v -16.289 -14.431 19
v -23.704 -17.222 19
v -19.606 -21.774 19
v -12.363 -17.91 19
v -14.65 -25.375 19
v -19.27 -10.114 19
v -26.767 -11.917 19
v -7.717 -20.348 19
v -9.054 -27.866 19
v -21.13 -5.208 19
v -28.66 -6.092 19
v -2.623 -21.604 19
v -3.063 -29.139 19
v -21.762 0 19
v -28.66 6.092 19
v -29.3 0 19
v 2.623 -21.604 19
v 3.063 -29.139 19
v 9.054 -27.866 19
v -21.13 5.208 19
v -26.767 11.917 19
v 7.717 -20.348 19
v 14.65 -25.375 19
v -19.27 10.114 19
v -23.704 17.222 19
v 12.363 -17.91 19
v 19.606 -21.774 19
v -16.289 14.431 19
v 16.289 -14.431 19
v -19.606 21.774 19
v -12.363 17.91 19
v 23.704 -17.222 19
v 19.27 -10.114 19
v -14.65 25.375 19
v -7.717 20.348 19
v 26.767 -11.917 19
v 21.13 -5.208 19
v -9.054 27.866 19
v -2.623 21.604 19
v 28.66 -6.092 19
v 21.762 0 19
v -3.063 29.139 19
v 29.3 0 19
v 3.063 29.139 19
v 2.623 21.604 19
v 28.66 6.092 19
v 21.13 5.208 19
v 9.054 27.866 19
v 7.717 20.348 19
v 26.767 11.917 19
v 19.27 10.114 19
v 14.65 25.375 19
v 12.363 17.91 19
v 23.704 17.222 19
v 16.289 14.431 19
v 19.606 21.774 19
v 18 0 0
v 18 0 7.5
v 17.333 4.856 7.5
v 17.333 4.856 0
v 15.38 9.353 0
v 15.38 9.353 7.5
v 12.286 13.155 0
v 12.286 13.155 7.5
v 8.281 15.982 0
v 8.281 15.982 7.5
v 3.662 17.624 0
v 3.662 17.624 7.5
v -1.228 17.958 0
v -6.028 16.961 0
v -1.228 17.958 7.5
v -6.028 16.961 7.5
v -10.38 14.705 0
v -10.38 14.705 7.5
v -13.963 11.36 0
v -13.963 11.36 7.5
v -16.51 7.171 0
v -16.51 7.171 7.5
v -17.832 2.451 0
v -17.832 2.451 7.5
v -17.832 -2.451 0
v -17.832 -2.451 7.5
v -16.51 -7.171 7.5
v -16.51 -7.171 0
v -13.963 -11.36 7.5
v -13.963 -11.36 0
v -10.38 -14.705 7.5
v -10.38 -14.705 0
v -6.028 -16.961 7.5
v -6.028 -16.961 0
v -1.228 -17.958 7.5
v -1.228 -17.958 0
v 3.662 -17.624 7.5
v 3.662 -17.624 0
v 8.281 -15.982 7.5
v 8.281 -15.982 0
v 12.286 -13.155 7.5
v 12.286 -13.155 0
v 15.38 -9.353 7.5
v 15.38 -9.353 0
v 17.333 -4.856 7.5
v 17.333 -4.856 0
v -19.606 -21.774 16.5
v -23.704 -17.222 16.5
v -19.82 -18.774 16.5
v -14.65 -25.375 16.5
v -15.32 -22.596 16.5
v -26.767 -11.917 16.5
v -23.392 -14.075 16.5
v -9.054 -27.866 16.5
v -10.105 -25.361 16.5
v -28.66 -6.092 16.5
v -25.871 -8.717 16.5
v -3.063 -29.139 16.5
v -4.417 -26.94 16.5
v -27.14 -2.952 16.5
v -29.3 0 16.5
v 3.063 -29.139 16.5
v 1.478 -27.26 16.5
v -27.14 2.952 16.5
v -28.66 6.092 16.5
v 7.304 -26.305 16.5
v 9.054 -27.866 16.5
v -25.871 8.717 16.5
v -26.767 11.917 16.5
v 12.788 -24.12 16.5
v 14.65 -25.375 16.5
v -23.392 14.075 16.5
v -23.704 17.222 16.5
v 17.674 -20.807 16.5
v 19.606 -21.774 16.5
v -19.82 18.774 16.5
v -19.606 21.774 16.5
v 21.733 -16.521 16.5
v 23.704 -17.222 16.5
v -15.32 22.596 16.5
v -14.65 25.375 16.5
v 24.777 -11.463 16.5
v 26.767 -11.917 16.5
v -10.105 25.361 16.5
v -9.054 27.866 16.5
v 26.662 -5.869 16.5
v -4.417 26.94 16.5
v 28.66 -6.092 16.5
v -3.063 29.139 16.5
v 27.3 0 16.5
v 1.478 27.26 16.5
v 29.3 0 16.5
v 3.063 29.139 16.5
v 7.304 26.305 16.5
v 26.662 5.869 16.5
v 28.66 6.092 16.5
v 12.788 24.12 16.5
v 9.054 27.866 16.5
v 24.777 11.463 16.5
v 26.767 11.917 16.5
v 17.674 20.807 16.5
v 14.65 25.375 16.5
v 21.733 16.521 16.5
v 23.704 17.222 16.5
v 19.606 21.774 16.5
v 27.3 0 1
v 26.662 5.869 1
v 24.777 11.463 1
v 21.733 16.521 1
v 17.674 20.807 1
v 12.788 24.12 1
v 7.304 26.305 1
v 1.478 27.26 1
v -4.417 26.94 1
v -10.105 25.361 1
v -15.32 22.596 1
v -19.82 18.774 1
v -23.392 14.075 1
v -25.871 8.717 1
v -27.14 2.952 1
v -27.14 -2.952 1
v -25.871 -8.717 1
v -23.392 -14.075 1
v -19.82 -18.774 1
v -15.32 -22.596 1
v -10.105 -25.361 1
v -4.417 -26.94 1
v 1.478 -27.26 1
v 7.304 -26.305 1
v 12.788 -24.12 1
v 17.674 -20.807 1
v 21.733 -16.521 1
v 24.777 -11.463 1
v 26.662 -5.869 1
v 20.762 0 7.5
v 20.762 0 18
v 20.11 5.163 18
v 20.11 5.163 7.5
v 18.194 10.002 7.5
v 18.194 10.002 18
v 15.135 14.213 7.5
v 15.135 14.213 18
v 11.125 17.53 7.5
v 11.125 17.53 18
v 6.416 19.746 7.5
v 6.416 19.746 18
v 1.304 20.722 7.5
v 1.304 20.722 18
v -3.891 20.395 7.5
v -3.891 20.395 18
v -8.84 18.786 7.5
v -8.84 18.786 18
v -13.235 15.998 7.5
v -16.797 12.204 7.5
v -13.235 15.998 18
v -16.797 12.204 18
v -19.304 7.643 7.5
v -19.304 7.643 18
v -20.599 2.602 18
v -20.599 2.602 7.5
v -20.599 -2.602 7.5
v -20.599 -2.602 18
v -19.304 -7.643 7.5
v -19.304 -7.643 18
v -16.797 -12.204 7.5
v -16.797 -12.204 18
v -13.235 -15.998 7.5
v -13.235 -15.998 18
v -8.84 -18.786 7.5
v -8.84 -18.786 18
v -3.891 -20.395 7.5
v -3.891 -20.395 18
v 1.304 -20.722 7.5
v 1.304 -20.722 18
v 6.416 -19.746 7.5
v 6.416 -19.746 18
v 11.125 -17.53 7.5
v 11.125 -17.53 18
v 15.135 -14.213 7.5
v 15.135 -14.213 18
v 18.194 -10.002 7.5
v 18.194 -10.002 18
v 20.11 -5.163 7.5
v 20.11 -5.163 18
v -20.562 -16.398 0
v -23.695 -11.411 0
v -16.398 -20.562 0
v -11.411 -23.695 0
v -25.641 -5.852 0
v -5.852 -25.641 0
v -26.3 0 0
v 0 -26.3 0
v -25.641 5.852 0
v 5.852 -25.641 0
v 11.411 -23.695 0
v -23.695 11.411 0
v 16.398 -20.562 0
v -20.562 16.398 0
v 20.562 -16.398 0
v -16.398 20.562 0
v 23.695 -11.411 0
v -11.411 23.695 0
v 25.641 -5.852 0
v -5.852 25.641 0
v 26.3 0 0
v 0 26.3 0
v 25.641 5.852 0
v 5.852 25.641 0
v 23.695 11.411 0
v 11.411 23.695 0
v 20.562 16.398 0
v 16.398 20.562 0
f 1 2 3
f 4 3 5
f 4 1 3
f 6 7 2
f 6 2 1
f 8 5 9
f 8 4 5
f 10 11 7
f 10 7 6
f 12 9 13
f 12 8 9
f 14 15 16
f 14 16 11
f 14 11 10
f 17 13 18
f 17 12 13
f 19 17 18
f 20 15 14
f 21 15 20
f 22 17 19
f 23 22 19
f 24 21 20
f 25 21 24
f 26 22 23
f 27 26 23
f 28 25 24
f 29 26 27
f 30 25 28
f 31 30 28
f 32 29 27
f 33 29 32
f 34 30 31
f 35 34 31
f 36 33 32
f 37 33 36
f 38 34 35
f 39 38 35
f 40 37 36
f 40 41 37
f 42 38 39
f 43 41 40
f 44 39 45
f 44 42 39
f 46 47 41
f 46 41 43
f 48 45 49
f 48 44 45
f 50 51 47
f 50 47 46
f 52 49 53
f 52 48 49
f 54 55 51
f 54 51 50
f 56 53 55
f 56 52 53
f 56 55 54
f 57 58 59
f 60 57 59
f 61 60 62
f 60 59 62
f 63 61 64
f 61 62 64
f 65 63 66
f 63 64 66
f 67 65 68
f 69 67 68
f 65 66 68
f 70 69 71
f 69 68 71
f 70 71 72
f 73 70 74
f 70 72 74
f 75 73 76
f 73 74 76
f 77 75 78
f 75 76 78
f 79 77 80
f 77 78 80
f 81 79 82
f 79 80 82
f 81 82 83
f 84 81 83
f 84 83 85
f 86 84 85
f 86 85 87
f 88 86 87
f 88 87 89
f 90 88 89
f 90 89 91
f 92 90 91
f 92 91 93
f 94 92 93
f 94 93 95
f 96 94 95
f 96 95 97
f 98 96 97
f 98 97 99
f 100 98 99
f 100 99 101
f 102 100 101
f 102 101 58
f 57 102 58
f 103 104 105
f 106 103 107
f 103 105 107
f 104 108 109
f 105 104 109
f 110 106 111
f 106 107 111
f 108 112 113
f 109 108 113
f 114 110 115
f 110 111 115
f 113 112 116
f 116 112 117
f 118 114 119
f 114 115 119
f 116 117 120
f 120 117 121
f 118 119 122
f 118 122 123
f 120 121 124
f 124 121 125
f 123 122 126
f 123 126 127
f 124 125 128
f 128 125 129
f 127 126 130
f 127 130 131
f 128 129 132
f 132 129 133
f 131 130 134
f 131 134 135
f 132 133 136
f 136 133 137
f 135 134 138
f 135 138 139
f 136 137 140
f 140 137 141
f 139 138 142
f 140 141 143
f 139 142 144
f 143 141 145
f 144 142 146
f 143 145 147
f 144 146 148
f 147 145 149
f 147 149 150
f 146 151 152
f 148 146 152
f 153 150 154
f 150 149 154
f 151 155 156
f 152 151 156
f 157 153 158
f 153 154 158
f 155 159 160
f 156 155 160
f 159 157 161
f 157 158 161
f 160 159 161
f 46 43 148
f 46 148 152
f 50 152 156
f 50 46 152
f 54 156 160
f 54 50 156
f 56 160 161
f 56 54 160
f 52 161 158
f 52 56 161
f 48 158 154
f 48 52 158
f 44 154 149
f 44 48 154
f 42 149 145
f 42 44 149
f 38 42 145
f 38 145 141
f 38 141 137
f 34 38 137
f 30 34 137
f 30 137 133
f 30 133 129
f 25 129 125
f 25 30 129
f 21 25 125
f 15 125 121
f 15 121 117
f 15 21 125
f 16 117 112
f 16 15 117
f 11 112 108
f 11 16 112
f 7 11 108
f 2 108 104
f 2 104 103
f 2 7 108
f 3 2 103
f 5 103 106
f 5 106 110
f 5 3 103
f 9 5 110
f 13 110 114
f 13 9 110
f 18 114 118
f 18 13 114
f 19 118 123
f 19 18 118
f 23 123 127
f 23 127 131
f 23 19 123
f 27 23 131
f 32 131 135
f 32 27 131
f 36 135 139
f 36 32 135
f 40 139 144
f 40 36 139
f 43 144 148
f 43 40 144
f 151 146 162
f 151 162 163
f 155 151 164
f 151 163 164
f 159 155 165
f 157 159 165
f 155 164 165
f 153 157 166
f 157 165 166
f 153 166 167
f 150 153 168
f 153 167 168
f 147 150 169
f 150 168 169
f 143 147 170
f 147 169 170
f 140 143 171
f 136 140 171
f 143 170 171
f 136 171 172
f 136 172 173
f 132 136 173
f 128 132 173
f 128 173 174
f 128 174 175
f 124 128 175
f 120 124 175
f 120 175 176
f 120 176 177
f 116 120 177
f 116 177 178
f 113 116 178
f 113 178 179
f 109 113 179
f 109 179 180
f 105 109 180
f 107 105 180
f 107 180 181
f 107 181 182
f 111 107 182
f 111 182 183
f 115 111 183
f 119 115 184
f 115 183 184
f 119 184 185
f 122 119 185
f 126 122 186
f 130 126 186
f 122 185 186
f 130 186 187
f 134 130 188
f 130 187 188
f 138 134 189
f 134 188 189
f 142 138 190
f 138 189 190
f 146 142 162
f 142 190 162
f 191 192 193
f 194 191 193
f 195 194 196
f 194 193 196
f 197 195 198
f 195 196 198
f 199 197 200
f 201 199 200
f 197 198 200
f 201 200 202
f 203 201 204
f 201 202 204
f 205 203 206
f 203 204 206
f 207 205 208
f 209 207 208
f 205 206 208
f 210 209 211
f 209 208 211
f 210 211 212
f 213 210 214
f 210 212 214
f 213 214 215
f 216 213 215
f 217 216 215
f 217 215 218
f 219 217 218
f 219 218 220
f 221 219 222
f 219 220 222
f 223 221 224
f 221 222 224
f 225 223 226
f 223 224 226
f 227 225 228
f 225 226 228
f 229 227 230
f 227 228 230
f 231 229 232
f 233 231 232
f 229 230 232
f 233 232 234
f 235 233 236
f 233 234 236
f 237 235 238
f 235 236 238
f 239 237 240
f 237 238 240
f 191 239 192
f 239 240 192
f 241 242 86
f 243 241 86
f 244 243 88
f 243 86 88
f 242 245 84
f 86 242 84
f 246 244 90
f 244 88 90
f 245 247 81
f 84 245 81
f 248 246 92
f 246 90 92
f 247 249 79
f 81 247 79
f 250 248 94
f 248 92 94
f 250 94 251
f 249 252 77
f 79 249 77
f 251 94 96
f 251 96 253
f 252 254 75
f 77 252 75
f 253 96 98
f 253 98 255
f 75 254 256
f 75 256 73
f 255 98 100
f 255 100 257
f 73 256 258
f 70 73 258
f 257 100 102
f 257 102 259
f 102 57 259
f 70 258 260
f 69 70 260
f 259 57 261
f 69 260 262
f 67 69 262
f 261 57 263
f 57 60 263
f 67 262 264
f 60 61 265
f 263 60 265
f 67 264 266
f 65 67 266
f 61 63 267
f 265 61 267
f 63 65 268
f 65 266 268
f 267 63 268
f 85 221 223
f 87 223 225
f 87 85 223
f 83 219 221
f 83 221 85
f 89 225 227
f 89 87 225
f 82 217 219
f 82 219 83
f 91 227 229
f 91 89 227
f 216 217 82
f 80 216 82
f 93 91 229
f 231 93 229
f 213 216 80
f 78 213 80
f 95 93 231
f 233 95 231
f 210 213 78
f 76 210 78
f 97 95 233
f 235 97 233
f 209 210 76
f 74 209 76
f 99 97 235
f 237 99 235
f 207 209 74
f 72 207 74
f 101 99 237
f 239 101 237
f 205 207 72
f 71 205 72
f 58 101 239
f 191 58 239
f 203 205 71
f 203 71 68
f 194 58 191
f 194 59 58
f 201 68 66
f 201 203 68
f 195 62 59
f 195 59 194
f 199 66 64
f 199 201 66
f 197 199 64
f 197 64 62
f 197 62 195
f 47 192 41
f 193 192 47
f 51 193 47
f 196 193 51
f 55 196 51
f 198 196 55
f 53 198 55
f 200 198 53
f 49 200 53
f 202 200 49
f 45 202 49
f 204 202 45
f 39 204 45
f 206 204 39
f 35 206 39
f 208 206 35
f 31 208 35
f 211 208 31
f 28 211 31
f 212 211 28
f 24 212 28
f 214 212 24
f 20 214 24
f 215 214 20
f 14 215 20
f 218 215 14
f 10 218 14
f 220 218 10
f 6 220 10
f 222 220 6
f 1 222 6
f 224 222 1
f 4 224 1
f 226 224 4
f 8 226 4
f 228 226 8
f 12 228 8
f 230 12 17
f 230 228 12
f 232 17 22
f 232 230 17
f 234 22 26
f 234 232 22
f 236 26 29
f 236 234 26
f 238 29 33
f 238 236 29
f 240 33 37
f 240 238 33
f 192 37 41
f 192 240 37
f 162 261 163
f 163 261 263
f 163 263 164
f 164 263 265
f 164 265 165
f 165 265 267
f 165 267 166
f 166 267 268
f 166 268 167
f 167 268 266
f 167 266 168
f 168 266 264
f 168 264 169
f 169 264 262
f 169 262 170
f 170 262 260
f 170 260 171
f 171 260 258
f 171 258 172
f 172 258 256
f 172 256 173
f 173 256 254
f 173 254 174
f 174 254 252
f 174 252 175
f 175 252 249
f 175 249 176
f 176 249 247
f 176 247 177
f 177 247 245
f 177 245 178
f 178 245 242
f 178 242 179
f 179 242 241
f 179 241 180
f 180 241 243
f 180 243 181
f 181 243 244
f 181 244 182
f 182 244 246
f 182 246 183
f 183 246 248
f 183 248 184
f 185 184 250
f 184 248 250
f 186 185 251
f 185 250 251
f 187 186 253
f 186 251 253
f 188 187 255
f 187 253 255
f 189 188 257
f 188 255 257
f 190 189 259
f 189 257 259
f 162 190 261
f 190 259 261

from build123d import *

# Parameters (mm, degrees)
F0_R     = 27.3
F1_DEPTH = 19
F2_R     = 20.7625
F3_DEPTH = 11.5
F4_R     = 18
F5_DEPTH = 7.501
F6_R     = 29.3
F6_R_2   = 27.3
F7_DEPTH = 2.5
F8_SIZE  = 1


with BuildPart() as f1:
    # F0 (on Top) → F1 (new body)
    with BuildSketch(Plane.XY):
        Circle(F0_R)
    extrude(amount=F1_DEPTH)

    # F2 (on face) → F3 (cut)
    with BuildSketch(Plane.XY.offset(19)):
        Circle(F2_R)
    extrude(amount=-F3_DEPTH, mode=Mode.SUBTRACT)

    # F4 (on face) → F5 (cut, through all)
    with BuildSketch(Plane.XY.offset(7.5)):
        Circle(F4_R)
    extrude(amount=-F5_DEPTH, mode=Mode.SUBTRACT)

    # F6 (on face) → F7 (join)
    with BuildSketch(Plane.XY.offset(19)):
        Circle(F6_R)
        Circle(F6_R_2, mode=Mode.SUBTRACT)
    extrude(amount=-F7_DEPTH)

    # F8
    f8_edges = [f1.edges().sort_by_distance(p)[0] for p in [
        (-27.3, 0, 0),
        (-20.7625, 0, 19),
    ]]
    chamfer(f8_edges, length=F8_SIZE)


solid = f1.part
